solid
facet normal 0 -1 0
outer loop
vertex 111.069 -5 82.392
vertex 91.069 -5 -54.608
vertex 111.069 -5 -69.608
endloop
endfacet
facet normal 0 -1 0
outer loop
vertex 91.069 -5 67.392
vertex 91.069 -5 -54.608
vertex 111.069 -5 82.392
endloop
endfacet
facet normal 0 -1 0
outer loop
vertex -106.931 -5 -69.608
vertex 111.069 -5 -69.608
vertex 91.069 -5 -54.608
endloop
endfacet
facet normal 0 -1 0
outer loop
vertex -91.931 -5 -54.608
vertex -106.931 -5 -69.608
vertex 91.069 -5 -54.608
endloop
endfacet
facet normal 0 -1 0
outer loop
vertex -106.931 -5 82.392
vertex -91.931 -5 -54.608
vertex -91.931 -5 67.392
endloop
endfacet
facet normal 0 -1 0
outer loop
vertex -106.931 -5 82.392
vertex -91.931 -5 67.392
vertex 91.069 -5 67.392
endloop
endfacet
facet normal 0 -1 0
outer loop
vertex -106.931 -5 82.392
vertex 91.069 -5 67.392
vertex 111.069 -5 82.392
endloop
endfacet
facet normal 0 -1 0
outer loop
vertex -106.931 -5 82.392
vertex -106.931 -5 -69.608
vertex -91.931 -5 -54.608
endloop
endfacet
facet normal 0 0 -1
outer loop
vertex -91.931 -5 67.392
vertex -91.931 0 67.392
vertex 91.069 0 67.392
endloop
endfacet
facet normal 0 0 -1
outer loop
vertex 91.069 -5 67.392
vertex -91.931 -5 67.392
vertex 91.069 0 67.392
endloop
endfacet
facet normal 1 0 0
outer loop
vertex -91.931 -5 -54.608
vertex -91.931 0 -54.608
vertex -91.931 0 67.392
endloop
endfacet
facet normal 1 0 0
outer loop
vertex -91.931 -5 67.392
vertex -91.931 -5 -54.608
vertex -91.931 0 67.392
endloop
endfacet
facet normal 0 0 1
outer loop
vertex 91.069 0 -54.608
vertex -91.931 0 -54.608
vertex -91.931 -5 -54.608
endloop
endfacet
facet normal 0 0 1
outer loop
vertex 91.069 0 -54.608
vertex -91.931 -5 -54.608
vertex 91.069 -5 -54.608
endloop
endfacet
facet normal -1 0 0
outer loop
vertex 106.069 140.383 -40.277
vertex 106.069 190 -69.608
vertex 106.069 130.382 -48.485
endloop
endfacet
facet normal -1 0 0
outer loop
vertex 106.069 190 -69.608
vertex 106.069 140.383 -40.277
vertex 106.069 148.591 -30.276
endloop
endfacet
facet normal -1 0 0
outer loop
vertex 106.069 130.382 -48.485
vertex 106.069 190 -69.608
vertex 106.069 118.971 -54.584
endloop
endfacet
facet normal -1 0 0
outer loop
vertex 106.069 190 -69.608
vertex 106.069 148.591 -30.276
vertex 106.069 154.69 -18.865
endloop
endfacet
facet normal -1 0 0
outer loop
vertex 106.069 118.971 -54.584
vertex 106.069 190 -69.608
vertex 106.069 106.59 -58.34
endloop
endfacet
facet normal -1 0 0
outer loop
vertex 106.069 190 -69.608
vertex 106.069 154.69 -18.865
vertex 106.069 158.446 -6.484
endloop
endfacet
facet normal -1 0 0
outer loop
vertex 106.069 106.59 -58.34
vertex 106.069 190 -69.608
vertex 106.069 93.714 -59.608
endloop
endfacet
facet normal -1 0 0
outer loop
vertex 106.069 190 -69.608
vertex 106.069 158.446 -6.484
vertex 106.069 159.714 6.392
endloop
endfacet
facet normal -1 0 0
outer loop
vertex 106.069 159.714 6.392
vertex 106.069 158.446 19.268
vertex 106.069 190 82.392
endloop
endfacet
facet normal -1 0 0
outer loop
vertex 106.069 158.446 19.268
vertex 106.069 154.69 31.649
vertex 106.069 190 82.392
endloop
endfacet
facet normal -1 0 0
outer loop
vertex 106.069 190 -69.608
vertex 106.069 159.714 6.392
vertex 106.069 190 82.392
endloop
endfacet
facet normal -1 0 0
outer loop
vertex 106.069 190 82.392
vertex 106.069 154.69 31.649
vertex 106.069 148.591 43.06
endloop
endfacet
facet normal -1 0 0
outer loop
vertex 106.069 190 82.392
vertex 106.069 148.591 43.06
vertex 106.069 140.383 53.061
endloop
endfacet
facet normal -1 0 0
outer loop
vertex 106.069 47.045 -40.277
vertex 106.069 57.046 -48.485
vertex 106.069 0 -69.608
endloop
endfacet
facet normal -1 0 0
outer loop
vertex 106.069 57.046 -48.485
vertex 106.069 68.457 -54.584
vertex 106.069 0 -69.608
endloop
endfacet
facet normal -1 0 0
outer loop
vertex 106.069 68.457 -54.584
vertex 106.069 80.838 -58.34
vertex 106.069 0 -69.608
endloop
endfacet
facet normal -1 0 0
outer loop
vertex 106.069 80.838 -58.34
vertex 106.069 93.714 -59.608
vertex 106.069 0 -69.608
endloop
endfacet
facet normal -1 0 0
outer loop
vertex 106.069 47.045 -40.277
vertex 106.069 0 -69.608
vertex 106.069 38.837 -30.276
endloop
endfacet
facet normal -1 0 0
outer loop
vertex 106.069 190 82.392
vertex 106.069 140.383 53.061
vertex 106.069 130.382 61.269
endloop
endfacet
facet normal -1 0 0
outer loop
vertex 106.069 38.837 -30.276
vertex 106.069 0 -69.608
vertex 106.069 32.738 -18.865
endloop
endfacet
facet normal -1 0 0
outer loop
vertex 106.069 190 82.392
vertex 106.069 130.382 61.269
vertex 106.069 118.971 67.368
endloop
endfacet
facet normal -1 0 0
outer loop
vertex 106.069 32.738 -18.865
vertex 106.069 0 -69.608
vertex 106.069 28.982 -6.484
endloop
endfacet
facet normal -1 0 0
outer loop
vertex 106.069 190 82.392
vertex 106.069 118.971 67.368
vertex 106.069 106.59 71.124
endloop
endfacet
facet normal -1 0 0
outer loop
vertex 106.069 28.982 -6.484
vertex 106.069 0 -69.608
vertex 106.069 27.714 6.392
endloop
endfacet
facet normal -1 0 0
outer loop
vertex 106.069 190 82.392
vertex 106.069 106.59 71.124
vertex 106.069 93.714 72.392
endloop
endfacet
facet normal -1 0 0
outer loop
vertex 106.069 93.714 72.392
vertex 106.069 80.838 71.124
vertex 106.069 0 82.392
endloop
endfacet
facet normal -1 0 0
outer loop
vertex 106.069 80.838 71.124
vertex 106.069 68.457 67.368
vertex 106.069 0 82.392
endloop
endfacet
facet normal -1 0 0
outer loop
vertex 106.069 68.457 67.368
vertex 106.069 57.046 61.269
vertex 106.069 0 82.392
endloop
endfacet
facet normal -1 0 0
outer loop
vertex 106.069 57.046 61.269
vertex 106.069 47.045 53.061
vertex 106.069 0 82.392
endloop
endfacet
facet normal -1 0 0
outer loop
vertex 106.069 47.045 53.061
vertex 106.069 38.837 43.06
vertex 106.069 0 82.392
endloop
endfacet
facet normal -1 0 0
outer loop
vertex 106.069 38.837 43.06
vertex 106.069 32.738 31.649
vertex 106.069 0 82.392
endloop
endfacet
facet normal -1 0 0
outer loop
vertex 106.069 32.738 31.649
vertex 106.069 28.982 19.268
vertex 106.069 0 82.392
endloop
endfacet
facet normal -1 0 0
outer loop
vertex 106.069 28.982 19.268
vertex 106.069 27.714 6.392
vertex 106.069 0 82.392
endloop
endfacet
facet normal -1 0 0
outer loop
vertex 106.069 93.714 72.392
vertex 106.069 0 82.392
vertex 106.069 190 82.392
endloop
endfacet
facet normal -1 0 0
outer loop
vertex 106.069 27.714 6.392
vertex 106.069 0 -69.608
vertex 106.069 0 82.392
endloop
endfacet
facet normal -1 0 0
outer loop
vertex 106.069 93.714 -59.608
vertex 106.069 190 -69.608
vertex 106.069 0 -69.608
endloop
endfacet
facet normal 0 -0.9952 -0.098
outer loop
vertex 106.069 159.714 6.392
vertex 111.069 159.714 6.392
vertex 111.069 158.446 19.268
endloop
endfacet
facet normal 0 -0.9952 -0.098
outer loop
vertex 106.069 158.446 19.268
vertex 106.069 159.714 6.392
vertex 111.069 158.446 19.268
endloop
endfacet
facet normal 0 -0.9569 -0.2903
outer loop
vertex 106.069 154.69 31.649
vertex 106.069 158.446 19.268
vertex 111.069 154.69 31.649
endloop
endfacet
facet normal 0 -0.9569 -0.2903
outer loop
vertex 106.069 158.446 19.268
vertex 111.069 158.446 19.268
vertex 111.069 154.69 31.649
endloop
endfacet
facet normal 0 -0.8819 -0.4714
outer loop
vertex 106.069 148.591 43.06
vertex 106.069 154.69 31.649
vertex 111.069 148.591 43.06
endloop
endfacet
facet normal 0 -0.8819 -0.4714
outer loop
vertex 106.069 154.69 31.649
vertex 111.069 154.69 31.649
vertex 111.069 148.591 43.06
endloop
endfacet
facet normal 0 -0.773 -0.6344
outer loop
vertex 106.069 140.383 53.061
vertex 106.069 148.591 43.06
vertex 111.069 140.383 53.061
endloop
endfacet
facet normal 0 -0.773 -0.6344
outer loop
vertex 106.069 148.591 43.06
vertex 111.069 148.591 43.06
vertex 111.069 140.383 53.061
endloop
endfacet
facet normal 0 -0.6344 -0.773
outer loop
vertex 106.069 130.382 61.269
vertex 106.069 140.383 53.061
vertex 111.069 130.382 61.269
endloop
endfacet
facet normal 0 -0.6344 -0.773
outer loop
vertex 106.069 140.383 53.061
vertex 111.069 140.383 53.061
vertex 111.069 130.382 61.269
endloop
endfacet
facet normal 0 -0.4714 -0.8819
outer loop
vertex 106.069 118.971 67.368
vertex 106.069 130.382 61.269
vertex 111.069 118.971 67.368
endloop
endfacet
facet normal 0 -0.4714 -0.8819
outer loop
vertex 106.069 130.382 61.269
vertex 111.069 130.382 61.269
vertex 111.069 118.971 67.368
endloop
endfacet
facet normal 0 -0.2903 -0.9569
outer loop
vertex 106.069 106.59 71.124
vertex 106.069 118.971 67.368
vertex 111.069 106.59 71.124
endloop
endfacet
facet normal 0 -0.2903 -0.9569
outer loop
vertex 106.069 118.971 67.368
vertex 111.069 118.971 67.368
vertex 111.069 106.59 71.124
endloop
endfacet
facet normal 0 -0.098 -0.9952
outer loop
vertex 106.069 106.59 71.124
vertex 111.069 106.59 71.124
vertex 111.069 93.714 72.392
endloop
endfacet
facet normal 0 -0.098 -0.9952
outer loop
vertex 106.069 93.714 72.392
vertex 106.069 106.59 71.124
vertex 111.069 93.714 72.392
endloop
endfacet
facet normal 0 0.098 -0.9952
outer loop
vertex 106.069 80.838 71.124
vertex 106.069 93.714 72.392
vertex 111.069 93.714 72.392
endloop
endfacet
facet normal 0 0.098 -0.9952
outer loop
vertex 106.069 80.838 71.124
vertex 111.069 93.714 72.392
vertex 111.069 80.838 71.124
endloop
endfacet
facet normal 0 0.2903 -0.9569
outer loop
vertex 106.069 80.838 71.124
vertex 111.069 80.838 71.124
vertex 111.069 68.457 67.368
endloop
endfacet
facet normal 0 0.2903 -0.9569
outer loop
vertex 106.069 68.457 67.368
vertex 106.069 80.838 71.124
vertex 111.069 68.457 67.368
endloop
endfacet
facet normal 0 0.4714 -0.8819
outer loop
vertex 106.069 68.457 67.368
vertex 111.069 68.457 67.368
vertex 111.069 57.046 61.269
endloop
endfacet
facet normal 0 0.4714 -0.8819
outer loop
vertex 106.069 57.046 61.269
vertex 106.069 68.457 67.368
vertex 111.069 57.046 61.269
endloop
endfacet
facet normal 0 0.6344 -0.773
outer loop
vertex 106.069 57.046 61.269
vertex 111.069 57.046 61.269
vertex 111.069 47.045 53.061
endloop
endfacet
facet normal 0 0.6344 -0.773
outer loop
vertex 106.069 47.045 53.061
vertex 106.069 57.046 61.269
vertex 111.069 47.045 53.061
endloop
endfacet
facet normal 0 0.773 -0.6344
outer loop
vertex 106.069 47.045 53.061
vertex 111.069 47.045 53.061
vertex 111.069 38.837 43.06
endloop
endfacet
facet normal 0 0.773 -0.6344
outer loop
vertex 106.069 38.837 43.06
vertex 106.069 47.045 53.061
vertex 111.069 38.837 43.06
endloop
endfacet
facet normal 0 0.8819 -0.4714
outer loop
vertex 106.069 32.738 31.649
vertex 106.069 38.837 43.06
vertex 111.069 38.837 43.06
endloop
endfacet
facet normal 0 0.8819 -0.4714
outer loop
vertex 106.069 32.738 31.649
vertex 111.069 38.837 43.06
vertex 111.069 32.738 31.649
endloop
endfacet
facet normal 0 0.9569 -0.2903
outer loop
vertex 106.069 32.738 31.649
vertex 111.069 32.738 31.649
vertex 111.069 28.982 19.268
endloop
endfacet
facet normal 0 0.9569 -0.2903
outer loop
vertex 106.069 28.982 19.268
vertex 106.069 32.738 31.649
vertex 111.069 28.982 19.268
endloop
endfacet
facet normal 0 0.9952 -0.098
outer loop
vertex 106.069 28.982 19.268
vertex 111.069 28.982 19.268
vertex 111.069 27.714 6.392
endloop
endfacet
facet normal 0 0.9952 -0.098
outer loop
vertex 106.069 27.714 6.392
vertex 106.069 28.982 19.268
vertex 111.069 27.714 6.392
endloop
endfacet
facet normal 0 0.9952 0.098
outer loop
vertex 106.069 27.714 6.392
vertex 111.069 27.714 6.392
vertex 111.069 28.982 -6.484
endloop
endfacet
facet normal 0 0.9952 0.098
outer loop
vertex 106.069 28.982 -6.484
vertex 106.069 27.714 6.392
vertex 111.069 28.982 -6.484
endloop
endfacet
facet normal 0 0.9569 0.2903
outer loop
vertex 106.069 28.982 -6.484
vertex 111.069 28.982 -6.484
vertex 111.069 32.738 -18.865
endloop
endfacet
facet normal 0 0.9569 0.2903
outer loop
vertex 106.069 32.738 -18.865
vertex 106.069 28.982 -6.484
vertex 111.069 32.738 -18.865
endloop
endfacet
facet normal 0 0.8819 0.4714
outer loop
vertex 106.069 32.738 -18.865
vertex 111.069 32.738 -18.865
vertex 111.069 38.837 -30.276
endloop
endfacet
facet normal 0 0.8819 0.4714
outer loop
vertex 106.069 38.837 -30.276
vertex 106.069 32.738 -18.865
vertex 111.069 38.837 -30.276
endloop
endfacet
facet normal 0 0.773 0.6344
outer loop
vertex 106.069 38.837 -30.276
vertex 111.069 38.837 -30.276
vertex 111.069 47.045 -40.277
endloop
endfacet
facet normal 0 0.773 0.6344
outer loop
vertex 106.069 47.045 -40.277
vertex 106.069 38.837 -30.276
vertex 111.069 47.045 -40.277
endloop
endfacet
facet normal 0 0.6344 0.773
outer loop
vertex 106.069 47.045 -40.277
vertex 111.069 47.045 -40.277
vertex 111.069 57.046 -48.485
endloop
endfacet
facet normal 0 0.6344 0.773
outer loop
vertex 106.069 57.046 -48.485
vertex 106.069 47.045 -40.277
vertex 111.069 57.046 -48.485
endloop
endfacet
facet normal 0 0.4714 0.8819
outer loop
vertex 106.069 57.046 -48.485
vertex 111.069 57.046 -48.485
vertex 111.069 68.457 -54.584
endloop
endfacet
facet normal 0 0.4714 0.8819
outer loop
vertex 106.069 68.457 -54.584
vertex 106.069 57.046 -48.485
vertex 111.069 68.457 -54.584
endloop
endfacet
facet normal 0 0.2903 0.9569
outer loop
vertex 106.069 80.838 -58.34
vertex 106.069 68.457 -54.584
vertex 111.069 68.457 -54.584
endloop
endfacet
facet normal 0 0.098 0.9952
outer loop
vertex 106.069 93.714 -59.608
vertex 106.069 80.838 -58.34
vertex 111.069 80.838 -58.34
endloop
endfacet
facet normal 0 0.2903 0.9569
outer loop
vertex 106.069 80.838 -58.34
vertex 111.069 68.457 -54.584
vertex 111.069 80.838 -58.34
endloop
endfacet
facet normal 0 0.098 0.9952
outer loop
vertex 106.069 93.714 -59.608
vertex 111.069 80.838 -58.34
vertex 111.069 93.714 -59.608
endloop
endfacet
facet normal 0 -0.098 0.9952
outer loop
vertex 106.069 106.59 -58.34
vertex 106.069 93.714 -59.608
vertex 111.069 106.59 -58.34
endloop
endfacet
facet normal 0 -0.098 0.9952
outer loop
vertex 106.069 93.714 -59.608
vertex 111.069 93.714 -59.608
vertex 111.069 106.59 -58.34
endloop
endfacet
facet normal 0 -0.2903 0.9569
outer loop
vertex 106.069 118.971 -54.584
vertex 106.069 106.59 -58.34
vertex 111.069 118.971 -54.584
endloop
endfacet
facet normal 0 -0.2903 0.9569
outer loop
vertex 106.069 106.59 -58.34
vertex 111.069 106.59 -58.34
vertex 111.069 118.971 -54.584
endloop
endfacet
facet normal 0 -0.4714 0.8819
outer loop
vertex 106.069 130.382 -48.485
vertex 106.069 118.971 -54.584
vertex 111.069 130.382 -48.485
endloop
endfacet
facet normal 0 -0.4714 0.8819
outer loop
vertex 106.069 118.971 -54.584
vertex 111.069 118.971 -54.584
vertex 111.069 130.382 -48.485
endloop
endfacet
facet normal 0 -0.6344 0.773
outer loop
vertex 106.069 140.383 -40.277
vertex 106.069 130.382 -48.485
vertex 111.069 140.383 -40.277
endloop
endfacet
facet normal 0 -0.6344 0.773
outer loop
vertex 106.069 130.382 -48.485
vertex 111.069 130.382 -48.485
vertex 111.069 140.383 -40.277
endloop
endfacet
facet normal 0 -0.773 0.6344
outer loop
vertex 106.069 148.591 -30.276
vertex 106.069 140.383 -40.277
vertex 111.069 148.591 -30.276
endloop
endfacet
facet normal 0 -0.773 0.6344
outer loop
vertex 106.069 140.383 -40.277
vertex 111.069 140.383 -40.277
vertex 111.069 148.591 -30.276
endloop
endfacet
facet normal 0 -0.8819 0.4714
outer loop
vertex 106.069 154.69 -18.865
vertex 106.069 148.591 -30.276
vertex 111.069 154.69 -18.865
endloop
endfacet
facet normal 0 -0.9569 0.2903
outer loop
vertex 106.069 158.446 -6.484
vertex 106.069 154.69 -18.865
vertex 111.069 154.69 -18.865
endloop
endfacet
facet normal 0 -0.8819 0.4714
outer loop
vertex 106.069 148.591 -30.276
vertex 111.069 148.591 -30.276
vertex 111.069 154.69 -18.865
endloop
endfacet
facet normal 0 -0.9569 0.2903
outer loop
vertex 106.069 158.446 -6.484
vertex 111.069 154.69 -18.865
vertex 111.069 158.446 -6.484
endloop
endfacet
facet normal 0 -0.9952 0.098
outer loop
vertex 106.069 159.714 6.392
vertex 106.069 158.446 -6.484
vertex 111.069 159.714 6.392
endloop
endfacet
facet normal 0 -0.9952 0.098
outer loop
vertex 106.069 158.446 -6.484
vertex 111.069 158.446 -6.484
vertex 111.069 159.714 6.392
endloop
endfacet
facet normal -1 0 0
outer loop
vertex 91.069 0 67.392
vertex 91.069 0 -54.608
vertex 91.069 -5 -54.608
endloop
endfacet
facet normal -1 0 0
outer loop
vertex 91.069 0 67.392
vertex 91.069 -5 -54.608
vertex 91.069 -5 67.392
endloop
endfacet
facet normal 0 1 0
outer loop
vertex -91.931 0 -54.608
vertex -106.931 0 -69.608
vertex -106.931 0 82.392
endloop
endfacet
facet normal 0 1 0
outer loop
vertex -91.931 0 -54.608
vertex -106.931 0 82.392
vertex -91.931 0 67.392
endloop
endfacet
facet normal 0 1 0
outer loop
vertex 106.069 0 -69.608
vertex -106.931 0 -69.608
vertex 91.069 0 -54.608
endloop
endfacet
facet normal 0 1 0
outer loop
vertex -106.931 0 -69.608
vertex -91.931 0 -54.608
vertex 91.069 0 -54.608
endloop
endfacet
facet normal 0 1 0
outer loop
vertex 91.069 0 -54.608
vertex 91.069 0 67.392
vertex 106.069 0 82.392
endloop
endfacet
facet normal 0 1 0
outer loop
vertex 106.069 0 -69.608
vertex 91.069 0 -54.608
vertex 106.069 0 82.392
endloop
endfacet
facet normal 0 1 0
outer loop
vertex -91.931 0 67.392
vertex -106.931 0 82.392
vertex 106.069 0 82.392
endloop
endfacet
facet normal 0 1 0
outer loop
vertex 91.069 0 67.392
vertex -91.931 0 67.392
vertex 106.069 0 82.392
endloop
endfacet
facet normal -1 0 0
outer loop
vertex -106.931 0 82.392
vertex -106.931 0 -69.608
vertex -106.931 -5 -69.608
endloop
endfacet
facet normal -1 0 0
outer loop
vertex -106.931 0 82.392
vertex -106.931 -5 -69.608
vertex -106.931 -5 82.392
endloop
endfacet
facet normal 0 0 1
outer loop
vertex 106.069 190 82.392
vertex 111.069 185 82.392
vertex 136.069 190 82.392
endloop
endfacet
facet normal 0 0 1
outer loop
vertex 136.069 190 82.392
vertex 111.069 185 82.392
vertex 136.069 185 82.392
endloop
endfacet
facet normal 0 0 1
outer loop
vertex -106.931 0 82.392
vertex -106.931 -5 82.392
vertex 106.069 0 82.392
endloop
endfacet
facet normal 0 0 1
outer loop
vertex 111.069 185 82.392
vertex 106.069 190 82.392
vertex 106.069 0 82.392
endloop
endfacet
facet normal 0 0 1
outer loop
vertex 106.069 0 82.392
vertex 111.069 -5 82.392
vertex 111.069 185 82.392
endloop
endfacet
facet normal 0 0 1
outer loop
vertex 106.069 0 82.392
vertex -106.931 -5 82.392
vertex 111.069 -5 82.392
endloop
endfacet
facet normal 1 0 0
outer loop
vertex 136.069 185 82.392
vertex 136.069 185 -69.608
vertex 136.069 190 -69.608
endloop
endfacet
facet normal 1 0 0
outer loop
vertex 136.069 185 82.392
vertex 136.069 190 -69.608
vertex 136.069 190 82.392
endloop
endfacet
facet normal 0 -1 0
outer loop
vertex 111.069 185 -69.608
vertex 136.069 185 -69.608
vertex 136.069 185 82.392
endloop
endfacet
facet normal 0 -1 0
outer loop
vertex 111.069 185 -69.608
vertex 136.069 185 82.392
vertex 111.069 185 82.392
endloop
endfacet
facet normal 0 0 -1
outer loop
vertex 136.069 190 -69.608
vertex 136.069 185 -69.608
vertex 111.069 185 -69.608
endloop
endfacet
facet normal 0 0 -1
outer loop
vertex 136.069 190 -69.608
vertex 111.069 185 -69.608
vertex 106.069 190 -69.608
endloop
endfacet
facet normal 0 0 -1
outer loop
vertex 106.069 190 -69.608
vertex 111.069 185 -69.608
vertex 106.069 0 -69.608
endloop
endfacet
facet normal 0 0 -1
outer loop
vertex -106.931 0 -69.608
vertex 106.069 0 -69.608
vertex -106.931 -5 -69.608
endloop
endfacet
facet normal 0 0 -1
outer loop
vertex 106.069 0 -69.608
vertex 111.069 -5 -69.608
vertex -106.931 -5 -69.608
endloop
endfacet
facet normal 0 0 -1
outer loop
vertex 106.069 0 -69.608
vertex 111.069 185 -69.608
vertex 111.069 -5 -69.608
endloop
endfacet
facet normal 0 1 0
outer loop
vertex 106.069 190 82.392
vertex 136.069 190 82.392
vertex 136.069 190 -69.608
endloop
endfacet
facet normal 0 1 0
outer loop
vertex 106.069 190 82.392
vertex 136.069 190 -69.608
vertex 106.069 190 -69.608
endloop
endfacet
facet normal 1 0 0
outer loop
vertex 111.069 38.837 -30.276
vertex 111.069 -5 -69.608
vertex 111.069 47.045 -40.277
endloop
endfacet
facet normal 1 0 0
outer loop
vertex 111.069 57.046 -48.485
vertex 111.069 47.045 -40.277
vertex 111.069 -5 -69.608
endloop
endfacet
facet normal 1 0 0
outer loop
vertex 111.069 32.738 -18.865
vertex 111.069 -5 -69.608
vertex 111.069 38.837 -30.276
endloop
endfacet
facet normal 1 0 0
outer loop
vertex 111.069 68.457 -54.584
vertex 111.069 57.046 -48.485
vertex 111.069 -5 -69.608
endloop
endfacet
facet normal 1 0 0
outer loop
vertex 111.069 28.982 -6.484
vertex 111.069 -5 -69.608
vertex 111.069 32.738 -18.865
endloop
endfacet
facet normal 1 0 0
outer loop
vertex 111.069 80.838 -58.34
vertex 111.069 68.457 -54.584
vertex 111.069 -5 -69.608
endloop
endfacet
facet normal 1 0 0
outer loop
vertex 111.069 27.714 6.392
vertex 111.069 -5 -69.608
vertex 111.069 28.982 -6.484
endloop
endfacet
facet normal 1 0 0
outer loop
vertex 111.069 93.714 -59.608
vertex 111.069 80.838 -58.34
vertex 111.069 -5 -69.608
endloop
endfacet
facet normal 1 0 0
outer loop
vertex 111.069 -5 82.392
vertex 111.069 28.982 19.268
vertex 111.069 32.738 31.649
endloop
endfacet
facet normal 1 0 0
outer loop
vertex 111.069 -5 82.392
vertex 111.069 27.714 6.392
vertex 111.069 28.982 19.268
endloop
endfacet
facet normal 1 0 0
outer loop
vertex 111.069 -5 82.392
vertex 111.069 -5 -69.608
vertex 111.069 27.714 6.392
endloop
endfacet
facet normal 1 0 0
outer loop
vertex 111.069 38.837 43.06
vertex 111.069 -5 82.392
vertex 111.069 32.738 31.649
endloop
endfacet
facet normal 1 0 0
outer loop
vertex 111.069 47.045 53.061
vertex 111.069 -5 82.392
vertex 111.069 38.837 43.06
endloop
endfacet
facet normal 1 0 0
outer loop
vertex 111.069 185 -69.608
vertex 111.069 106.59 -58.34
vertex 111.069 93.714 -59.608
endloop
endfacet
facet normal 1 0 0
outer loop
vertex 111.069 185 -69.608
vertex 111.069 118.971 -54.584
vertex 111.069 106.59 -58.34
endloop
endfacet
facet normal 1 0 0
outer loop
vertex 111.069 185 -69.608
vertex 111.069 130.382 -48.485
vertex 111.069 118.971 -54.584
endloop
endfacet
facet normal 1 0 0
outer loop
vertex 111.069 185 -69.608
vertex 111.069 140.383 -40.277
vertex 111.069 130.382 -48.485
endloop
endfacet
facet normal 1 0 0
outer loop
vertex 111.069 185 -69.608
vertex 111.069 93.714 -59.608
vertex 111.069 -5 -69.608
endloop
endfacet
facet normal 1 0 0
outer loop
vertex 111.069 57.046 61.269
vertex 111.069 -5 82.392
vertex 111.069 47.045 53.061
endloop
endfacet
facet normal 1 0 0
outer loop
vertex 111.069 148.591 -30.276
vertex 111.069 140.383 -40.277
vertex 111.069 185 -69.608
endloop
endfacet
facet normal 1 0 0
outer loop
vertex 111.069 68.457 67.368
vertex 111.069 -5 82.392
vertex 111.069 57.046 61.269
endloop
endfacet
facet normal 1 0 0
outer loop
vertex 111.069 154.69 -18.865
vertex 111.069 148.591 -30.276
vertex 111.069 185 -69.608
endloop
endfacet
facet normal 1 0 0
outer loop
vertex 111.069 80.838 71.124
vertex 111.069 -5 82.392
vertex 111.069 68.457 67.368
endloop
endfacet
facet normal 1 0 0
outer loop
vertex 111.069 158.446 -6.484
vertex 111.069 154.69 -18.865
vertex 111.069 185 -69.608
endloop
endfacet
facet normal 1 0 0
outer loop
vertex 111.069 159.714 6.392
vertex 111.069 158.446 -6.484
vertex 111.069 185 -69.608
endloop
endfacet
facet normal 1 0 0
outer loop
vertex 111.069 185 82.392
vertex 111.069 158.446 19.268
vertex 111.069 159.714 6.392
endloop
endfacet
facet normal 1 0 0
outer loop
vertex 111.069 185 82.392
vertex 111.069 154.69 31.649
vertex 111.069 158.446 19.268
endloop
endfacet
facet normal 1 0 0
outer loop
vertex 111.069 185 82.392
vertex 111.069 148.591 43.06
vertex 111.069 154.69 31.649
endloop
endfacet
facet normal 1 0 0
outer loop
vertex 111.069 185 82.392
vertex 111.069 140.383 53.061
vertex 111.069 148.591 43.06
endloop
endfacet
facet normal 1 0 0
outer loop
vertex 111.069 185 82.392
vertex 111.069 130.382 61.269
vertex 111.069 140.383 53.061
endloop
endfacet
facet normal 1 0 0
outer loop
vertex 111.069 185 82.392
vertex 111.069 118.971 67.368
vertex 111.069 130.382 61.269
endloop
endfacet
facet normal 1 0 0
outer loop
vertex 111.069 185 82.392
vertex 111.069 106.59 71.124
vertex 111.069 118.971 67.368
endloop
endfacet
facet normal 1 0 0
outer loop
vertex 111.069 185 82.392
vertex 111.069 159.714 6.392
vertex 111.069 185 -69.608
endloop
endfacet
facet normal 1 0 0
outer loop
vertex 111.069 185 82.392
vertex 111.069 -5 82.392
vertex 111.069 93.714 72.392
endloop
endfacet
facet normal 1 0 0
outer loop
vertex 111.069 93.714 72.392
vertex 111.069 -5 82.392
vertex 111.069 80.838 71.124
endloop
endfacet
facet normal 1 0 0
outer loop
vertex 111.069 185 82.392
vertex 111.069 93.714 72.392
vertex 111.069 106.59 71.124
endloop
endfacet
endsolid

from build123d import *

# Parameters (mm, degrees)
F0_W     = 213
F0_H     = 152
F0_W_2   = 183
F0_H_2   = 122
F1_DEPTH = 5
F2_W     = 185
F2_H     = 152
F2_W_2   = 5
F3_DEPTH = 5
F4_R     = 66
F5_DEPTH = 25
F6_W     = 25
F6_H     = 152
F6_W_2   = 5
F7_DEPTH = 5


with BuildPart() as f1:
    # F0 (on Front) → F1 (new body)
    with BuildSketch(Plane.XZ):
        with Locations((-0.431097, 6.392034)):
            Rectangle(F0_W, F0_H)
        with Locations((-0.431097, 6.392034)):
            Rectangle(F0_W_2, F0_H_2, mode=Mode.SUBTRACT)
    extrude(amount=F1_DEPTH)

    # F2 (on face) → F3 (join)
    with BuildSketch(Plane.YZ.offset(106.068903)):
        with Locations((92.5, 6.392034)):
            Rectangle(F2_W, F2_H)
        with Locations((-2.5, 6.392034)):
            Rectangle(F2_W_2, F2_H)
    extrude(amount=F3_DEPTH)

    # F4 (on face) → F5 (cut)
    with BuildSketch(Plane.YZ.offset(111.068903)):
        with Locations((93.713939, 6.392034)):
            Circle(F4_R)
    extrude(amount=-F5_DEPTH, mode=Mode.SUBTRACT)

    # F6 (on face) → F7 (join)
    with BuildSketch(Plane(origin=(0, 185, 0), x_dir=(-1, 0, 0), z_dir=(0, 1, 0))):
        with Locations((-123.568903, 6.392034)):
            Rectangle(F6_W, F6_H)
        with Locations((-108.568903, 6.392034)):
            Rectangle(F6_W_2, F6_H)
    extrude(amount=F7_DEPTH)


solid = f1.part
